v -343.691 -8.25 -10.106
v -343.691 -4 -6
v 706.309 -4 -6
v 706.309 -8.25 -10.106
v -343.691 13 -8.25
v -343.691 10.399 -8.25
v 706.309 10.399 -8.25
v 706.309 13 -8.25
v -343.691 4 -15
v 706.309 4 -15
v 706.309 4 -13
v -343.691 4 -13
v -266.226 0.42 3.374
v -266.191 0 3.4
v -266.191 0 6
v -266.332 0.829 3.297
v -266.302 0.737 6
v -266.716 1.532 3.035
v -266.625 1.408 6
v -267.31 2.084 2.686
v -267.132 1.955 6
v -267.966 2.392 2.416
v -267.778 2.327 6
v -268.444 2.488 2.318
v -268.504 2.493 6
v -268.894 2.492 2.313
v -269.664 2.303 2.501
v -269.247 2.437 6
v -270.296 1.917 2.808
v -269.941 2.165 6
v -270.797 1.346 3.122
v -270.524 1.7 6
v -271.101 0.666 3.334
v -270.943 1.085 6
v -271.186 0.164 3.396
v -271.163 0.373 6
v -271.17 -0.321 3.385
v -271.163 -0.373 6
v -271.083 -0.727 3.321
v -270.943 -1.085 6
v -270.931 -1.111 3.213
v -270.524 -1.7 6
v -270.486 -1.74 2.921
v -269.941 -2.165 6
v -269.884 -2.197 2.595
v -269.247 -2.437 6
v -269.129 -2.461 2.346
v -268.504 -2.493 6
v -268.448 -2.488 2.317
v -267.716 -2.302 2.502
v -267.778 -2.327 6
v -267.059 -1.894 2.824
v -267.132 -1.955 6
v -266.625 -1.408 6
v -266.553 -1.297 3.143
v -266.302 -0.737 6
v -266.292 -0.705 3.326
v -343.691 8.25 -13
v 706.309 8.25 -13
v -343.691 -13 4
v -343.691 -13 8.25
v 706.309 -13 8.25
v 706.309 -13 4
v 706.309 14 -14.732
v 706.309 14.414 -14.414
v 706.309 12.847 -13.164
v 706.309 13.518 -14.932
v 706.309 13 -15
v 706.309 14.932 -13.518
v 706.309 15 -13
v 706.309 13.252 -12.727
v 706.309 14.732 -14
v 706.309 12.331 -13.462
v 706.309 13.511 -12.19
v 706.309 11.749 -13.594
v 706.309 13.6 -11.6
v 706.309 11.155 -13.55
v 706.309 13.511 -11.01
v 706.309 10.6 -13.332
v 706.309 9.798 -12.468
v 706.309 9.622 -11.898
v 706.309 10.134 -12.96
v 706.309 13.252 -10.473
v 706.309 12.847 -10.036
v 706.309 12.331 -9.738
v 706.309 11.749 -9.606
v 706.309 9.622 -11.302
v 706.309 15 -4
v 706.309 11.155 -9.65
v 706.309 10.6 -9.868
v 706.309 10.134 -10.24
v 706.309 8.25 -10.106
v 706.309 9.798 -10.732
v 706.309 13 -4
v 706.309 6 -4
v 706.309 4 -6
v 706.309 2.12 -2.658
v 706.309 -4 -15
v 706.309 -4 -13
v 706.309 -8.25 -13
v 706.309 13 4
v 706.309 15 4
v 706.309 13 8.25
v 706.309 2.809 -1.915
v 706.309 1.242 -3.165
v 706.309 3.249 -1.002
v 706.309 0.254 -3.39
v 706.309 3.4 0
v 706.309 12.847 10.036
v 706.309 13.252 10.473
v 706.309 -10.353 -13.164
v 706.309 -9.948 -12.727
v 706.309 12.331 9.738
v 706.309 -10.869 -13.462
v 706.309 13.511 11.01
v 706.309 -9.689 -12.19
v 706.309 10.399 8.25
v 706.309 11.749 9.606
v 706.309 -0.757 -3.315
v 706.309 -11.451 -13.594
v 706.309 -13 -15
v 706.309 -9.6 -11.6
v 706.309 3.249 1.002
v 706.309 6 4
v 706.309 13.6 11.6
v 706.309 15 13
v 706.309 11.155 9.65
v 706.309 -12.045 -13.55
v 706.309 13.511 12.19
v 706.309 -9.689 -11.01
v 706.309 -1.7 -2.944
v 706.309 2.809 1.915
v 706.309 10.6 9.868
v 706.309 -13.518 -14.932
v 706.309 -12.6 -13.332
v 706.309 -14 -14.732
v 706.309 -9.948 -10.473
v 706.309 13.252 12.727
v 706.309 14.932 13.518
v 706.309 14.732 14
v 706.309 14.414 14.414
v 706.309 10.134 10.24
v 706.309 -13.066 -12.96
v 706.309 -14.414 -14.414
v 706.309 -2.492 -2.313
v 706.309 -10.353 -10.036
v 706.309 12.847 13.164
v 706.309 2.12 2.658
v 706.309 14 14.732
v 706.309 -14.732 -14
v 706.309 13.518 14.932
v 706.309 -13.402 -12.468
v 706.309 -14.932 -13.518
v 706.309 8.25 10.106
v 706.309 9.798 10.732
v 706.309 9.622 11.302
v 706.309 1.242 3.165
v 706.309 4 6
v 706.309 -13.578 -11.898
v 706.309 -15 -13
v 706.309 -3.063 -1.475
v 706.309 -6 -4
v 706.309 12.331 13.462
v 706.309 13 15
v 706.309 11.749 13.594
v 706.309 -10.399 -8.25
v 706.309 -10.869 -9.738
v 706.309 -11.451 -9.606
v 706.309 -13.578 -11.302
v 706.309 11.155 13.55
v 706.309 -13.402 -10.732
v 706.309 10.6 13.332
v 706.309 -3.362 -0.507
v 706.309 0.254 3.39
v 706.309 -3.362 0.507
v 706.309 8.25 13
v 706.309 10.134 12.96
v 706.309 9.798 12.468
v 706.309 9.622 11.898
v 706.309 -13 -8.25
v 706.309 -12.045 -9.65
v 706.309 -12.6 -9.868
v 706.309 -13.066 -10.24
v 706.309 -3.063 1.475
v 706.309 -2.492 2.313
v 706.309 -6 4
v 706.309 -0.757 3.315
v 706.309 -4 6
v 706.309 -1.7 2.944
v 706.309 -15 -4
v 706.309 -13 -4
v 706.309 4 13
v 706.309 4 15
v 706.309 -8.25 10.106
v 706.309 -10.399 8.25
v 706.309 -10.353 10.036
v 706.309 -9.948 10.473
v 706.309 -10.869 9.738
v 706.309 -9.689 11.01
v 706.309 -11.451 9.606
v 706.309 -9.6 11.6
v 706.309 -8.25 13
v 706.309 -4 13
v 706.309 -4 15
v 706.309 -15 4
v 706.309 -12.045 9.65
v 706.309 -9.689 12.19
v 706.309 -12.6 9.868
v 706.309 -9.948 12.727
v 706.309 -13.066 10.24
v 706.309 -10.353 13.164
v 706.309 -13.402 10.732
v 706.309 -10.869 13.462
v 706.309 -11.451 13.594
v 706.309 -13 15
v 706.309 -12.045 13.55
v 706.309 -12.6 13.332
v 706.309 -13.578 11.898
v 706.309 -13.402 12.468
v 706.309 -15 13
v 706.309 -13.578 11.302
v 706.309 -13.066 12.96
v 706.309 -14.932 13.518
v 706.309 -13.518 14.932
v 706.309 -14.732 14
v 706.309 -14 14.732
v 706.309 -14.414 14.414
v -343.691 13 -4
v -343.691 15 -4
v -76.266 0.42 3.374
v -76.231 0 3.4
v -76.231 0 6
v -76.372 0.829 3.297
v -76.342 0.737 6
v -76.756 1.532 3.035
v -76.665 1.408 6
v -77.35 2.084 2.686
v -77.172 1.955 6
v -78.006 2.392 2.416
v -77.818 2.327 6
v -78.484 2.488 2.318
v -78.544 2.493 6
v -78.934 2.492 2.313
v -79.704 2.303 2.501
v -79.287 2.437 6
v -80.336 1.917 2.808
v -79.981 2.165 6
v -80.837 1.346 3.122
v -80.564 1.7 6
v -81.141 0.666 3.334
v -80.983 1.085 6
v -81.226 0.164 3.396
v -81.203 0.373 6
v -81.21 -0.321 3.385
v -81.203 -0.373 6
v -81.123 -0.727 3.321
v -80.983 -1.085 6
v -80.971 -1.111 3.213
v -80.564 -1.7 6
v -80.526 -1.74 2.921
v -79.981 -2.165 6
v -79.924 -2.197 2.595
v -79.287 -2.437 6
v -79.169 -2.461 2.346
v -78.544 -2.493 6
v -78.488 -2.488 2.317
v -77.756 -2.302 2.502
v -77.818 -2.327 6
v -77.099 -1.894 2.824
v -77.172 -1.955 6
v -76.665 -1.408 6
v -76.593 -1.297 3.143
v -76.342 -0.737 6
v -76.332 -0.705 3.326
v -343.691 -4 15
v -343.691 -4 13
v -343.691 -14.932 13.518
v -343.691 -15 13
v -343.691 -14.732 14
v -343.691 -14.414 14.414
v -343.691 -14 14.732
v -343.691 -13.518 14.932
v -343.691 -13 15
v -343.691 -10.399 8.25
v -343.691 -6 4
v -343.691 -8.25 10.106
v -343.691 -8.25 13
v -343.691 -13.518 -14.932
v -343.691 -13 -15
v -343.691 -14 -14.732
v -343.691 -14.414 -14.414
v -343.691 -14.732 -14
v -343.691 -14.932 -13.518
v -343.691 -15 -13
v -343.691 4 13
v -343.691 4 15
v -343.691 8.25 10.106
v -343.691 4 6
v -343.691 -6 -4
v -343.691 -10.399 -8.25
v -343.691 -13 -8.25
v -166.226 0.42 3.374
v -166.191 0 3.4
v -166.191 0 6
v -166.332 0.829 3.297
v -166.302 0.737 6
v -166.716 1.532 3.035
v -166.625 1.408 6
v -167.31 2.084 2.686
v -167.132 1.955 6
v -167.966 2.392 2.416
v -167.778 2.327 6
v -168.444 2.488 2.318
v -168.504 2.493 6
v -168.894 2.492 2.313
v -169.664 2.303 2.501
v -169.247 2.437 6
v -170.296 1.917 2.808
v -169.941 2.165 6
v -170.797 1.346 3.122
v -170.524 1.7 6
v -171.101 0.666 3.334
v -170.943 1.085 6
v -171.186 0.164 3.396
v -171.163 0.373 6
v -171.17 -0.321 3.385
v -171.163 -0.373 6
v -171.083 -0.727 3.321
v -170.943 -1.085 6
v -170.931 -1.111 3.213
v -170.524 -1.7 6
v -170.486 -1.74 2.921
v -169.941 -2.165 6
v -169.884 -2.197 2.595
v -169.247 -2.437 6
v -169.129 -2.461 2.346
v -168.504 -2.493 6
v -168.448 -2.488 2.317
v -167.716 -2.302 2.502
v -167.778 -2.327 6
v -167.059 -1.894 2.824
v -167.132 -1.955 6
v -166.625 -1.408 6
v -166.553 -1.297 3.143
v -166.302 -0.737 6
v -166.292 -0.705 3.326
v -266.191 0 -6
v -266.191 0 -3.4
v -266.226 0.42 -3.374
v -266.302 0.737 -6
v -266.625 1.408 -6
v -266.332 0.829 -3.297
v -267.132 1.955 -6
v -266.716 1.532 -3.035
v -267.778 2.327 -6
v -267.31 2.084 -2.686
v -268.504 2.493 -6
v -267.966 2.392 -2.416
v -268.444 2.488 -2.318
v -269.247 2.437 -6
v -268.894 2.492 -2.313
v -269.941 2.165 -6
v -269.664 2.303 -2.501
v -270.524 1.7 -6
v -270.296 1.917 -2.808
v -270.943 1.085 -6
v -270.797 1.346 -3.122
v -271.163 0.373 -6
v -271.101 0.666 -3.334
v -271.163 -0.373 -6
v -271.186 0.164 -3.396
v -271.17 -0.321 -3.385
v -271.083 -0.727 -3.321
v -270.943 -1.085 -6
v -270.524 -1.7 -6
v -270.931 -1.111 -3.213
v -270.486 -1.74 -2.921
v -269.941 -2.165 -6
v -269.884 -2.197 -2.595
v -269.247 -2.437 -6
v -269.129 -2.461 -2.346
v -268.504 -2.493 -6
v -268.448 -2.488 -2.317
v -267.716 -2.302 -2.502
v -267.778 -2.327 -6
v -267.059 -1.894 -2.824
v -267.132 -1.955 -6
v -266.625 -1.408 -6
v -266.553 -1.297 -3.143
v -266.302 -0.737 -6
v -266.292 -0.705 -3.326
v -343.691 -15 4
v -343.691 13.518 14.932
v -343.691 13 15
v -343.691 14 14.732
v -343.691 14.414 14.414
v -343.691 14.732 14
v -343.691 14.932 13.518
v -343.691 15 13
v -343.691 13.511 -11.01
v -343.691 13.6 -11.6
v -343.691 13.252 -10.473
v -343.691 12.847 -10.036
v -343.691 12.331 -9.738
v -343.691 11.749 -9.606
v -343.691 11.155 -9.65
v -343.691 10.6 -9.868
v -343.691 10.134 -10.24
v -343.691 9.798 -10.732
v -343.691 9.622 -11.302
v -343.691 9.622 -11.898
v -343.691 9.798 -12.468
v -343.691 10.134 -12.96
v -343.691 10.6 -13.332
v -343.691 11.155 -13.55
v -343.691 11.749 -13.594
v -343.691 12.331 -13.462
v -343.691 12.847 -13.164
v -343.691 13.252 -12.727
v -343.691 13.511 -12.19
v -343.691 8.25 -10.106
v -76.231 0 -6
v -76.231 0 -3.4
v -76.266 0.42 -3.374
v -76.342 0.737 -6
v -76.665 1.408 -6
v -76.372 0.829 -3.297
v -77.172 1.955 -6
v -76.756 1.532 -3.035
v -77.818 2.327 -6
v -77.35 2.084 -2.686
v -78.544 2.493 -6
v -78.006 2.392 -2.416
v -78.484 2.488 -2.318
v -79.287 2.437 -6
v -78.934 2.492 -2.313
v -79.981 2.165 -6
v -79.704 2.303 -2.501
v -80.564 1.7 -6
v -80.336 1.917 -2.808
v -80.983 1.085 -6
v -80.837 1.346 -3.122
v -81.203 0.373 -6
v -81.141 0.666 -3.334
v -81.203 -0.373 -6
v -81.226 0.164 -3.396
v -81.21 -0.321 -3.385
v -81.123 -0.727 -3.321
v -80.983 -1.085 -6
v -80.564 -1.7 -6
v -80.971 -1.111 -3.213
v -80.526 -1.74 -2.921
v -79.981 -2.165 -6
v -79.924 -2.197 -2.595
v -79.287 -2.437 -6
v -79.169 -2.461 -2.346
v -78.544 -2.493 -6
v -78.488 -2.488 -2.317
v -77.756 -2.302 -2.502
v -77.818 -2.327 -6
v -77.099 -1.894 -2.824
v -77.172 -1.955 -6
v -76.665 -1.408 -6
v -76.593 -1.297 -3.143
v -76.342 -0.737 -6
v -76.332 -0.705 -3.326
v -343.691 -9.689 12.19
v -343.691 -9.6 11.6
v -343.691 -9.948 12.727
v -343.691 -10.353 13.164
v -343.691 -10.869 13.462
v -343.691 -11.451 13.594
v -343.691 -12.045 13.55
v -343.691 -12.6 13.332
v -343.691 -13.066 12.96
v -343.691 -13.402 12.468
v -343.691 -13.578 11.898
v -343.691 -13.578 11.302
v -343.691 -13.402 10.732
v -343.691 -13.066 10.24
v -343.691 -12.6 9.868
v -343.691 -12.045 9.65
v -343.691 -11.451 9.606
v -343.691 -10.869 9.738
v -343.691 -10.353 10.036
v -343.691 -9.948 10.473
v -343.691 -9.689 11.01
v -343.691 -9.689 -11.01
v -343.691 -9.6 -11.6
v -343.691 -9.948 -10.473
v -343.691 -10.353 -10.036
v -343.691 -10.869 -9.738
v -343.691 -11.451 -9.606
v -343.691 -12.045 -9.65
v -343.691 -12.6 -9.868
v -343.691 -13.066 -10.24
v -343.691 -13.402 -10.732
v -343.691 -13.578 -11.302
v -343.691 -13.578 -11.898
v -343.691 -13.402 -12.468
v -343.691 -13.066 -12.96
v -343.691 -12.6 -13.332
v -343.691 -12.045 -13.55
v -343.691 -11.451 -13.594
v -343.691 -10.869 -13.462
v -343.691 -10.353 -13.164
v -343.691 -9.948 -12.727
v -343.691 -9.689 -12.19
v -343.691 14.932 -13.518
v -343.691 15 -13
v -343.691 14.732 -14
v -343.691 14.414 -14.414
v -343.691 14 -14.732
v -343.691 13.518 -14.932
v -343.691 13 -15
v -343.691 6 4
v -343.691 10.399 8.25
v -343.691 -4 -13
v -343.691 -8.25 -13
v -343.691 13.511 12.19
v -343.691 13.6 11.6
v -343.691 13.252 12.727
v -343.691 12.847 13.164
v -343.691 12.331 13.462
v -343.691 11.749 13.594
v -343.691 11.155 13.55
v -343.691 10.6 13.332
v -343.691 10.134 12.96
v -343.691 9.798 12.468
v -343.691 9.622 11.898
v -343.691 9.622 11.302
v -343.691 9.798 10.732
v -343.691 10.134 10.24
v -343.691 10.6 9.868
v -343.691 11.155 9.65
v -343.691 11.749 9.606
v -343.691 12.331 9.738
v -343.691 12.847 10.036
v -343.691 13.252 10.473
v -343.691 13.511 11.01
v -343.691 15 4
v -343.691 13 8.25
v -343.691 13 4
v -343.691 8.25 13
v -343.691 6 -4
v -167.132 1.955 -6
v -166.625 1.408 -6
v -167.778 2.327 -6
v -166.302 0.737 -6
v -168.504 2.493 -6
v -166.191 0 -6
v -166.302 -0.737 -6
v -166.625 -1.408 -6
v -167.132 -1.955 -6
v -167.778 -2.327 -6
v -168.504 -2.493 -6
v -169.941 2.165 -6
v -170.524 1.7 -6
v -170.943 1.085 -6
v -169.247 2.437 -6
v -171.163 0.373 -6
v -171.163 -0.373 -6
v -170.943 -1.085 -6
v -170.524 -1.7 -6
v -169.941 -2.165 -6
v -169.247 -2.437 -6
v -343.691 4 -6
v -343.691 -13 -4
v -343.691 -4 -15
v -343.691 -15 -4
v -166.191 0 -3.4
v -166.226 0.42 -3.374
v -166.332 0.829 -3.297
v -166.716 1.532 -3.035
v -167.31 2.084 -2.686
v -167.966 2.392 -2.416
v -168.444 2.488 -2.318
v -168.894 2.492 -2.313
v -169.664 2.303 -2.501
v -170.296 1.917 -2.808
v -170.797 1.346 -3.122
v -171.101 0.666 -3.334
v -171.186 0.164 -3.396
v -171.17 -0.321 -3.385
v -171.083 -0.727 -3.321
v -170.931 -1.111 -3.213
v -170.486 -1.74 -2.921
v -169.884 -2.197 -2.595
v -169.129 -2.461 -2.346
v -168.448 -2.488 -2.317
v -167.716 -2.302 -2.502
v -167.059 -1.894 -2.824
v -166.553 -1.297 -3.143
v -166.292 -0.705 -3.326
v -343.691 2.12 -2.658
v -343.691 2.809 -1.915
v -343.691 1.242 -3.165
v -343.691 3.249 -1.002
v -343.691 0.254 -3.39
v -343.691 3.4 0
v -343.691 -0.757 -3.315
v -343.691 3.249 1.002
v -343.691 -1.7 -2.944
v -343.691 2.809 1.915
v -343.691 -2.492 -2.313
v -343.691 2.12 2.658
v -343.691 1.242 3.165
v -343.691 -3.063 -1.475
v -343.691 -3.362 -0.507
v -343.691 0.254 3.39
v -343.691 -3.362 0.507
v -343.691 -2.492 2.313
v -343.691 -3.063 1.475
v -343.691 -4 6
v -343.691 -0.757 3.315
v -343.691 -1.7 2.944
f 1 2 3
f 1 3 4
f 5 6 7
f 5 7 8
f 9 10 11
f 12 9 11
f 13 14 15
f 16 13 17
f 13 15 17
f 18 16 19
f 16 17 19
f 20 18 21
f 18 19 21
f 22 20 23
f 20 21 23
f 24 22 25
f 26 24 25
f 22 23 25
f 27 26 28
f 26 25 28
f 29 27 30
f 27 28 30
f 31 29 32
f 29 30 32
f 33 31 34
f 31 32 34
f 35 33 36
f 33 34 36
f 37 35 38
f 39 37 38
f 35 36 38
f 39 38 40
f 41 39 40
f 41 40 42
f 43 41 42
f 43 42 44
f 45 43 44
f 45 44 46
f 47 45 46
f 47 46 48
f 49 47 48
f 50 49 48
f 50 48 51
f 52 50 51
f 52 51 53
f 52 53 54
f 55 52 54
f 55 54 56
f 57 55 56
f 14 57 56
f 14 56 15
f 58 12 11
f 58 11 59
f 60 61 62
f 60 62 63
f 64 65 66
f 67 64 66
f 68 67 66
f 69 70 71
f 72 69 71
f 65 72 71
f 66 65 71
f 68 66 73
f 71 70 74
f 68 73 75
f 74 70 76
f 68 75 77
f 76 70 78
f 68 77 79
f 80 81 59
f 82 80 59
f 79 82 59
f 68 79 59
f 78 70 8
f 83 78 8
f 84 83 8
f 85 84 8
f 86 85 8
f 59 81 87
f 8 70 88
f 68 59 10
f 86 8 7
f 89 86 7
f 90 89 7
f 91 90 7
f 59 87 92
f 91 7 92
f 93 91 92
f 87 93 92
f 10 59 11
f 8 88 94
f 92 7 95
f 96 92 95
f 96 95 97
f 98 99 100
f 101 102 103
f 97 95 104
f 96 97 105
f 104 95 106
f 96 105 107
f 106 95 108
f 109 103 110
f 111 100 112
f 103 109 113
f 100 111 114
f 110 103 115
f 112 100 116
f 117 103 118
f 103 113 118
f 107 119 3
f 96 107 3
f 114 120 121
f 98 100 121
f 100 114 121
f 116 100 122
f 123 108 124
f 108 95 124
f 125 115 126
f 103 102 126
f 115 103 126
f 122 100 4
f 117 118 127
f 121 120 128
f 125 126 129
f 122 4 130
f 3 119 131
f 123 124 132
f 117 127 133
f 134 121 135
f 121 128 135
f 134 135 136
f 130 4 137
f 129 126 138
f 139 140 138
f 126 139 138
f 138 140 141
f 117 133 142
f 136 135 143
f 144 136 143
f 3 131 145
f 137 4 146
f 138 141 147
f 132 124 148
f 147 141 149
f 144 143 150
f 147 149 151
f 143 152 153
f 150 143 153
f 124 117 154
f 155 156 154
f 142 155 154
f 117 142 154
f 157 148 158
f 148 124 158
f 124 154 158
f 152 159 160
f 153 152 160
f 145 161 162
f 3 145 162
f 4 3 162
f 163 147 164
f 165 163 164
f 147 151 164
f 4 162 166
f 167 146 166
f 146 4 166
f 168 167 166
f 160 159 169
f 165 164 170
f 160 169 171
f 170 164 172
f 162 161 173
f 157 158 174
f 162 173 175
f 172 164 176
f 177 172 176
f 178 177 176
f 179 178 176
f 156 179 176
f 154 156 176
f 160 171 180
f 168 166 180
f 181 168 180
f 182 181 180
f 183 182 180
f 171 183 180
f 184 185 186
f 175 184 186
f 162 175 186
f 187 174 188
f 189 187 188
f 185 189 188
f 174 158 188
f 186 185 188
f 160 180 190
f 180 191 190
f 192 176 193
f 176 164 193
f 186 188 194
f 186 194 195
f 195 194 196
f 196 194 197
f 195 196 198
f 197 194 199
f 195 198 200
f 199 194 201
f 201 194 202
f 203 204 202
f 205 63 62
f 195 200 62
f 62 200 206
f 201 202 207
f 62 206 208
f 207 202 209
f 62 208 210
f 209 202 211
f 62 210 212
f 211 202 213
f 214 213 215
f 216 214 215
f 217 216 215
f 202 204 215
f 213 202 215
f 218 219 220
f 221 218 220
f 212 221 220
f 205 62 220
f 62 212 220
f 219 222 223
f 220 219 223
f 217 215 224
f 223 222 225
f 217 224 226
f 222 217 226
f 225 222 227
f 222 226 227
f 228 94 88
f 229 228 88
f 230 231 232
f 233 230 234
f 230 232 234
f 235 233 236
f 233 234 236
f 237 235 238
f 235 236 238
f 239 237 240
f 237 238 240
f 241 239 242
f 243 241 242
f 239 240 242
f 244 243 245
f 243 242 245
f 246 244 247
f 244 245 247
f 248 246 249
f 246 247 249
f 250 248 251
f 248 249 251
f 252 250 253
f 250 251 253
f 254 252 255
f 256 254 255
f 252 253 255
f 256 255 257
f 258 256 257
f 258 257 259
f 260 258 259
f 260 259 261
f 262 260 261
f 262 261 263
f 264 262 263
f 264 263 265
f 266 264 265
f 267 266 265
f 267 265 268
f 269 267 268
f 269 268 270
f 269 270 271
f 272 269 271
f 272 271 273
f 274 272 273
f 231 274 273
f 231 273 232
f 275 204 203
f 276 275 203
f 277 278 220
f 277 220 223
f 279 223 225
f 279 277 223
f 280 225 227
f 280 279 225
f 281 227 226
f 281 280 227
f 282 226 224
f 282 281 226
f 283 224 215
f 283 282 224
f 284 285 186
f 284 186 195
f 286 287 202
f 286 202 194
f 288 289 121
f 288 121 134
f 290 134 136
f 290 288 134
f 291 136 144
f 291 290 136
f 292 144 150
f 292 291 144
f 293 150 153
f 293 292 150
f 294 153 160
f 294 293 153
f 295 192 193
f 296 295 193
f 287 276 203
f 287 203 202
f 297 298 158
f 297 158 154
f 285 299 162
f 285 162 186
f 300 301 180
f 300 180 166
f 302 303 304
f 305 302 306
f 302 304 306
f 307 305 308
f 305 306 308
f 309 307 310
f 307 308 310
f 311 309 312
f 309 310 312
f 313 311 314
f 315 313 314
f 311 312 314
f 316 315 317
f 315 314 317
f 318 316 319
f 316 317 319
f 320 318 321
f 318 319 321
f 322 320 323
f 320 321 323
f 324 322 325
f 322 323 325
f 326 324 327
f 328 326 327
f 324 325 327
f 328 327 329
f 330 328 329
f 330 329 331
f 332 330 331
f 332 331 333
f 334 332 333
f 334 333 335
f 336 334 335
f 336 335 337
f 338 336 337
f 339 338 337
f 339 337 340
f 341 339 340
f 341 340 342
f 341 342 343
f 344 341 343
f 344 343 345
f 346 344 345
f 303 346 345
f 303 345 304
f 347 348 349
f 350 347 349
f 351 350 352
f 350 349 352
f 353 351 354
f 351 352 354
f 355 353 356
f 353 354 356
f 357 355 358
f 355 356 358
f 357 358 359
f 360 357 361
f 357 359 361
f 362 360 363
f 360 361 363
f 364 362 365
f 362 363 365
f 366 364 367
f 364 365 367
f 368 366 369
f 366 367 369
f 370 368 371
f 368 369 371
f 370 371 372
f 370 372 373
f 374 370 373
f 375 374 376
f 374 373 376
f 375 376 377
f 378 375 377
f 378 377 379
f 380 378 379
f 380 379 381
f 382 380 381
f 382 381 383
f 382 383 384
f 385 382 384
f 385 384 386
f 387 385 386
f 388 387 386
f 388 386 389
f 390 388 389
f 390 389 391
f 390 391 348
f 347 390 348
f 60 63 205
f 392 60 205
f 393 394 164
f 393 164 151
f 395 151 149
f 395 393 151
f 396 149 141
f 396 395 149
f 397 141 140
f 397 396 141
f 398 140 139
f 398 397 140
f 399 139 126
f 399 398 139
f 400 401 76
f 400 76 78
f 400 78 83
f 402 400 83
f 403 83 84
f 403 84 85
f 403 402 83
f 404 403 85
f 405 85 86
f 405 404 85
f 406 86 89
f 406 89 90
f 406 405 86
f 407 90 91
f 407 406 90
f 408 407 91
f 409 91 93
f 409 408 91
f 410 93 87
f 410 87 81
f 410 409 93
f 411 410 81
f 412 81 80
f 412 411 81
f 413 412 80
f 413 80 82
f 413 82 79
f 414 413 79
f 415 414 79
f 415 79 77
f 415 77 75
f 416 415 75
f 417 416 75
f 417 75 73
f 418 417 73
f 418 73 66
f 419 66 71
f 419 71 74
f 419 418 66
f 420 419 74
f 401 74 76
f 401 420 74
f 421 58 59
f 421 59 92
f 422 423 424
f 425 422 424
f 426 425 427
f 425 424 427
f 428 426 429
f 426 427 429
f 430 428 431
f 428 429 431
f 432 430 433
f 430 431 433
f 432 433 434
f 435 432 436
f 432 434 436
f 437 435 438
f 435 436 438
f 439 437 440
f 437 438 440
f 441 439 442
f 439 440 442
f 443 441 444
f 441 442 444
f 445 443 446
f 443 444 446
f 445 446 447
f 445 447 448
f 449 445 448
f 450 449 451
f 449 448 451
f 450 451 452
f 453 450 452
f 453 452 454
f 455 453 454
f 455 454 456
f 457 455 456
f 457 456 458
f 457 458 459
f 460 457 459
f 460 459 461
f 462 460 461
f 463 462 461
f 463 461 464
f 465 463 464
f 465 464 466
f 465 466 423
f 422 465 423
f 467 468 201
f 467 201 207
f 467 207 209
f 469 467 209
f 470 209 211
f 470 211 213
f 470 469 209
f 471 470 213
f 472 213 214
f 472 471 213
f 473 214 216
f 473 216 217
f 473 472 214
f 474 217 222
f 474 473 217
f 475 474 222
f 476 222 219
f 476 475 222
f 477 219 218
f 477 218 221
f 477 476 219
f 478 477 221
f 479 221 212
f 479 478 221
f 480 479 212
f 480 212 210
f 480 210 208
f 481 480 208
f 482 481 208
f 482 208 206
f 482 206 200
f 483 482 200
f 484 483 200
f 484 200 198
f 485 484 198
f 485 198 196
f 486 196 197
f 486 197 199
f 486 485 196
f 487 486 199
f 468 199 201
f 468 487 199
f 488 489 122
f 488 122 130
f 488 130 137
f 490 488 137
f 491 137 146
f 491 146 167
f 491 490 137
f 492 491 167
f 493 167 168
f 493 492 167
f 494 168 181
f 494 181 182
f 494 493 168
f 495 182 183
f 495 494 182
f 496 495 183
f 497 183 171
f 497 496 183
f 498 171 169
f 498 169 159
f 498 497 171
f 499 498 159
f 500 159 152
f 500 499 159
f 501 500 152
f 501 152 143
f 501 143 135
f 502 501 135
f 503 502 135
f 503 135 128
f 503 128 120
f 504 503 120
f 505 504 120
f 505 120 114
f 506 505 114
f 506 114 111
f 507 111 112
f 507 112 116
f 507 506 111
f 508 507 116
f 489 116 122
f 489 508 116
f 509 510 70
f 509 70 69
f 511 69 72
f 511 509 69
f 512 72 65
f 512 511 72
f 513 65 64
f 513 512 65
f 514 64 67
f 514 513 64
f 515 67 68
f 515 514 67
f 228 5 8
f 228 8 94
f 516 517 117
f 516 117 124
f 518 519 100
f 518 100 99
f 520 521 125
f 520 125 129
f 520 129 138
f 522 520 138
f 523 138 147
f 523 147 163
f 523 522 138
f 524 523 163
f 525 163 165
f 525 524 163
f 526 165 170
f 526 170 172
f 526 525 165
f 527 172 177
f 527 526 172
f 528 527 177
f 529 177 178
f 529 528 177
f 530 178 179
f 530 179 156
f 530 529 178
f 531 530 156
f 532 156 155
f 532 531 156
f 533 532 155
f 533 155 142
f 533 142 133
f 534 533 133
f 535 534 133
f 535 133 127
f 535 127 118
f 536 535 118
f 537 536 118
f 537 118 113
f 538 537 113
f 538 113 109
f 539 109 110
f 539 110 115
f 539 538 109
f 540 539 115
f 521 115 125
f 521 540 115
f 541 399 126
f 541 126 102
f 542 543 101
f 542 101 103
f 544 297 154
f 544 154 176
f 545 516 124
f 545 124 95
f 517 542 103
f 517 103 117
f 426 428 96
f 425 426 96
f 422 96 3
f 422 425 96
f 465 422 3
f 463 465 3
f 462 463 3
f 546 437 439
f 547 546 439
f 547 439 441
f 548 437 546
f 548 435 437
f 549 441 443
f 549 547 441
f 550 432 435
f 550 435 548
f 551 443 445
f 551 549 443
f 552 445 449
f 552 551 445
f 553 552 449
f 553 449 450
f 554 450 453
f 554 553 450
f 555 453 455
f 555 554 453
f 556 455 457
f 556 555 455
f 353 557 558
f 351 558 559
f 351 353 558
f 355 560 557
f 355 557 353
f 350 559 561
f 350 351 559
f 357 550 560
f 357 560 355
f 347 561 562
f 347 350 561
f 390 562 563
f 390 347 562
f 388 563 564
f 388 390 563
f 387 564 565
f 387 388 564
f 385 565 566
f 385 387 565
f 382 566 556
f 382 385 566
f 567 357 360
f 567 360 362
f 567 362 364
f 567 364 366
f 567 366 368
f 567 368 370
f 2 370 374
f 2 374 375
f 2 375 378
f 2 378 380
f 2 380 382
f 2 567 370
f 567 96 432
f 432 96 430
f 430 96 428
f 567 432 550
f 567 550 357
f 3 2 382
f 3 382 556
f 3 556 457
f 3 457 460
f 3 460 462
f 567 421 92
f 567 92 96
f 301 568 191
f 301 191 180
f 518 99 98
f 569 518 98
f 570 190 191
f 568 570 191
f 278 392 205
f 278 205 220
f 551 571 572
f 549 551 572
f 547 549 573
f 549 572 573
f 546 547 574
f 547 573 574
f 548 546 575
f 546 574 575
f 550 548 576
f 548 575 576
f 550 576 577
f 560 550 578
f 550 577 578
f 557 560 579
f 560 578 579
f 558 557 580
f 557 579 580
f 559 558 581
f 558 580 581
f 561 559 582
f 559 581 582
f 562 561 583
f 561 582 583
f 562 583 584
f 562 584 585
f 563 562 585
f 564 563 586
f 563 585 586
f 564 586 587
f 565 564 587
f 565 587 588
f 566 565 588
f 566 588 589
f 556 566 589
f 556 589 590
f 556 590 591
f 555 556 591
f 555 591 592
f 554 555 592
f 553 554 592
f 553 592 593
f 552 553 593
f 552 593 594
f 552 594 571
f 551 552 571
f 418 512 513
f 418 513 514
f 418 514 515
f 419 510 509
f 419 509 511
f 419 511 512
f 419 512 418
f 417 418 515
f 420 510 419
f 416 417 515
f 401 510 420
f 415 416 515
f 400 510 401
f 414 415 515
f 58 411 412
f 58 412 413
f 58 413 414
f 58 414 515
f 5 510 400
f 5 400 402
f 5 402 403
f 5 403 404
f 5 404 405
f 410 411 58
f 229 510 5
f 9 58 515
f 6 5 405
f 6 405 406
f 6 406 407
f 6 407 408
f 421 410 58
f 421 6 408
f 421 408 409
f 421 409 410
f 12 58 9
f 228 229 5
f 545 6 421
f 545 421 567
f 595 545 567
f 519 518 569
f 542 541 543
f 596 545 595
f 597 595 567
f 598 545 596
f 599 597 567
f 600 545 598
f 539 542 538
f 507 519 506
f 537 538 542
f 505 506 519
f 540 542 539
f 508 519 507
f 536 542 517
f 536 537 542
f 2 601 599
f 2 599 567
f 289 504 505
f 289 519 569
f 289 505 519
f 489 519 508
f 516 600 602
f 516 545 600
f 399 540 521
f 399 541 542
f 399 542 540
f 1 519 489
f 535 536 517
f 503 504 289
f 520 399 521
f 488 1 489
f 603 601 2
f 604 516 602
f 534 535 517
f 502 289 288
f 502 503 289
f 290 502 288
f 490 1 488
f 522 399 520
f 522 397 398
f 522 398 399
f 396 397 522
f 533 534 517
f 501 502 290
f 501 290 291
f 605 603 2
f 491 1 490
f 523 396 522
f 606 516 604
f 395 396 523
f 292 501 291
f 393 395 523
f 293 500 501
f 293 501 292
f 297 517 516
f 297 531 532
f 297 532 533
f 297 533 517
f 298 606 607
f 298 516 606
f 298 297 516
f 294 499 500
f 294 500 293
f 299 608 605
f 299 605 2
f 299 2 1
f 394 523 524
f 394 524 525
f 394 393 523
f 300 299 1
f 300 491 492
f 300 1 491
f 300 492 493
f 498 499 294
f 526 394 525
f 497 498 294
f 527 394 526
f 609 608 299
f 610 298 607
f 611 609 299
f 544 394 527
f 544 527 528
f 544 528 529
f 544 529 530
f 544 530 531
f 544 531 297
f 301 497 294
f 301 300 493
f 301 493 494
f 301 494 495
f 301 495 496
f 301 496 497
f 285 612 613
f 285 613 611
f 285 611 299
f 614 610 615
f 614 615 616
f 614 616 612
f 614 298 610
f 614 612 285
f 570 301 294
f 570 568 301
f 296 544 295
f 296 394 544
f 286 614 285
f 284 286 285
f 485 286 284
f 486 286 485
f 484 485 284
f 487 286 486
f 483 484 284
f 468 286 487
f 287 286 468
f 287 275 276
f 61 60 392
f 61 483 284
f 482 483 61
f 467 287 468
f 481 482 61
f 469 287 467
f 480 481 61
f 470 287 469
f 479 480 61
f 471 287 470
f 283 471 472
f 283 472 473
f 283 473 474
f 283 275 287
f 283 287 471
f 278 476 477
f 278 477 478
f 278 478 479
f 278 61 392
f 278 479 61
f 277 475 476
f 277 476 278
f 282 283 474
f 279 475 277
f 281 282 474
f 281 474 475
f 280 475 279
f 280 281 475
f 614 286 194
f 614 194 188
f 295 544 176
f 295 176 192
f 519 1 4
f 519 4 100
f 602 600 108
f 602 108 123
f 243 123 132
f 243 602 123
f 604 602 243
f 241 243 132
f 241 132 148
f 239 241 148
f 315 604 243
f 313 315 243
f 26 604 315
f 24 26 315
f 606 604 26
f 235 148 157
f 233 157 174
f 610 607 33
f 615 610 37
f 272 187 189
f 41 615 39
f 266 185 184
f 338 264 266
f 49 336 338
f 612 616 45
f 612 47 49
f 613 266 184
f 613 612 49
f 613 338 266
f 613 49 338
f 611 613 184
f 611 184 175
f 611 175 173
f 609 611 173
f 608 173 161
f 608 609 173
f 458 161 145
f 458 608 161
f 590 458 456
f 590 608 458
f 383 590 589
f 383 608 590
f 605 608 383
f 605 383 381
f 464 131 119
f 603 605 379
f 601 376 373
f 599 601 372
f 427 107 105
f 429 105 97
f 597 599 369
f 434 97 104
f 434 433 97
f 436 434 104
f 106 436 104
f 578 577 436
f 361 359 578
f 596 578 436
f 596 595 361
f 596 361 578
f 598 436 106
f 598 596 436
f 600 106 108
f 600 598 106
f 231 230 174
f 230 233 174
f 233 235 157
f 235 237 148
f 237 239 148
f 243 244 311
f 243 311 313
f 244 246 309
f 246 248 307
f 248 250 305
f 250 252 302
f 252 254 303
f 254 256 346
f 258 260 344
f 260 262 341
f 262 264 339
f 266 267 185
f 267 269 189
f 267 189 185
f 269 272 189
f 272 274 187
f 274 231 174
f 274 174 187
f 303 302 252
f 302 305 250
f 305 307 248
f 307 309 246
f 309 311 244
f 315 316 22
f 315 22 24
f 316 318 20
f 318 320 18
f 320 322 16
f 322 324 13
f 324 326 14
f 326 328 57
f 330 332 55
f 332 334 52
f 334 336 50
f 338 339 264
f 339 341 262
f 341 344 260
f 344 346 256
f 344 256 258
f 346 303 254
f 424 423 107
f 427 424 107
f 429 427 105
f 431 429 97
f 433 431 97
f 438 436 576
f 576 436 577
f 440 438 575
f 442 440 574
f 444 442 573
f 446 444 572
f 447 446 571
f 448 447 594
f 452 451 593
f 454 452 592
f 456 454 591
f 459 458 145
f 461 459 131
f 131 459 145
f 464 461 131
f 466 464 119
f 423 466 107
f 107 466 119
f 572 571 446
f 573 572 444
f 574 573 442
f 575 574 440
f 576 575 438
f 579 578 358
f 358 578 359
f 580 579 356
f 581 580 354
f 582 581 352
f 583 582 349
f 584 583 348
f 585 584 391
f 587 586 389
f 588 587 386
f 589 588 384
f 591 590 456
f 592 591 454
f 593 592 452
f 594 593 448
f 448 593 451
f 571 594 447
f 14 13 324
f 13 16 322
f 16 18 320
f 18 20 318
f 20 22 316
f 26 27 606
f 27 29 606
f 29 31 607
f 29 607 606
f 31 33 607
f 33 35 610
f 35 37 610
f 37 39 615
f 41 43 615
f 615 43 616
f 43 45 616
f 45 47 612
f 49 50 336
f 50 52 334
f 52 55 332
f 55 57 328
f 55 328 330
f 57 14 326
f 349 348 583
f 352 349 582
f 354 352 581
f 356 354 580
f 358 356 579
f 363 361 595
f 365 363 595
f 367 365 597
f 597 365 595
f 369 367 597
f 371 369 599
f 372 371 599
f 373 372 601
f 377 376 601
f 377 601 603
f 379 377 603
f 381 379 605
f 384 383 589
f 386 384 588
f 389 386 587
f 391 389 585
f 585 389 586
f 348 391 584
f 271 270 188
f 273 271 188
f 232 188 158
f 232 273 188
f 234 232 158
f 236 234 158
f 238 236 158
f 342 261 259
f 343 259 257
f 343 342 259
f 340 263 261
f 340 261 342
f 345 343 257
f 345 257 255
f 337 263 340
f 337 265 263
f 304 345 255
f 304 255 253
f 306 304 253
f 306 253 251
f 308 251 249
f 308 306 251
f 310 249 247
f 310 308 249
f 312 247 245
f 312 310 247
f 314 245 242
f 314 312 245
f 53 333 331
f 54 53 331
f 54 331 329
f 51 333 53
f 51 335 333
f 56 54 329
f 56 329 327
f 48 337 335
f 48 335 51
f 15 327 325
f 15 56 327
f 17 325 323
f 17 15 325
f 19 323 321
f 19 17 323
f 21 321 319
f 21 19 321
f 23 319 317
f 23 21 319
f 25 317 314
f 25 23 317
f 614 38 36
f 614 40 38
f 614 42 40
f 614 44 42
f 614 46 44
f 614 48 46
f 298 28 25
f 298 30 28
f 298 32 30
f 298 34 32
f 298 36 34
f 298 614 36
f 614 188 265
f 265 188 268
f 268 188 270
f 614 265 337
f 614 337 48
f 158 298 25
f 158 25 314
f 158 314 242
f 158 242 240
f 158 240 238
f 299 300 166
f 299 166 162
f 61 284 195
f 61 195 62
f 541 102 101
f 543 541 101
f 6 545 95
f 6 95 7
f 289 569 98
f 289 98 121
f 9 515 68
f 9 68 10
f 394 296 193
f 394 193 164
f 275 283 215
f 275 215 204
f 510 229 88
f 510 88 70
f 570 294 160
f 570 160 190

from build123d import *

# Parameters (mm, degrees)
SKETCH11_R                = 3.4
SKETCH11_R_2              = 2
NEW_ALUM_ALUM3BY3_1_DEPTH = 1050
SKETCH12_R                = 2.5
CUT_EXTRUDE1_DEPTH        = 707.780320658


with BuildPart() as part:
    # Sketch11 → New alum ALUM3BY3(1) (new body)
    with BuildSketch(Plane.YZ.offset(-343.690987124)):
        with BuildLine():
            Line((-4, 6), (4, 6))
            Line((4, 6), (8.25, 10.106126974))
            Line((8.25, 10.106126974), (8.25, 13))
            Line((8.25, 13), (4, 13))
            Line((4, 13), (4, 15))
            Line((4, 15), (13, 15))
            ThreePointArc((13, 15), (14.414213562, 14.414213562), (15, 13))
            Line((15, 13), (15, 4))
            Line((15, 4), (13, 4))
            Line((13, 4), (13, 8.25))
            Line((13, 8.25), (10.398914138, 8.25))
            Line((10.398914138, 8.25), (6, 4))
            Line((6, 4), (6, -4))
            Line((6, -4), (10.398914138, -8.25))
            Line((10.398914138, -8.25), (13, -8.25))
            Line((13, -8.25), (13, -4))
            Line((13, -4), (15, -4))
            Line((15, -4), (15, -13))
            ThreePointArc((15, -13), (14.414213562, -14.414213562), (13, -15))
            Line((13, -15), (4, -15))
            Line((4, -15), (4, -13))
            Line((4, -13), (8.25, -13))
            Line((8.25, -13), (8.25, -10.106126974))
            Line((8.25, -10.106126974), (4, -6))
            Line((4, -6), (-4, -6))
            Line((-4, -6), (-8.25, -10.106126974))
            Line((-8.25, -10.106126974), (-8.25, -13))
            Line((-8.25, -13), (-4, -13))
            Line((-4, -13), (-4, -15))
            Line((-4, -15), (-13, -15))
            ThreePointArc((-13, -15), (-14.414213562, -14.414213562), (-15, -13))
            Line((-15, -13), (-15, -4))
            Line((-15, -4), (-13, -4))
            Line((-13, -4), (-13, -8.25))
            Line((-13, -8.25), (-10.398914138, -8.25))
            Line((-10.398914138, -8.25), (-6, -4))
            Line((-6, -4), (-6, 4))
            Line((-6, 4), (-10.398914138, 8.25))
            Line((-10.398914138, 8.25), (-13, 8.25))
            Line((-13, 8.25), (-13, 4))
            Line((-13, 4), (-15, 4))
            Line((-15, 4), (-15, 13))
            ThreePointArc((-15, 13), (-14.414213562, 14.414213562), (-13, 15))
            Line((-13, 15), (-4, 15))
            Line((-4, 15), (-4, 13))
            Line((-4, 13), (-8.25, 13))
            Line((-8.25, 13), (-8.25, 10.106126974))
            Line((-8.25, 10.106126974), (-4, 6))
        make_face()
        Circle(SKETCH11_R, mode=Mode.SUBTRACT)
        with Locations((11.6, 11.6)):
            Circle(SKETCH11_R_2, mode=Mode.SUBTRACT)
        with Locations((-11.6, 11.6)):
            Circle(SKETCH11_R_2, mode=Mode.SUBTRACT)
        with Locations((11.6, -11.6)):
            Circle(SKETCH11_R_2, mode=Mode.SUBTRACT)
        with Locations((-11.6, -11.6)):
            Circle(SKETCH11_R_2, mode=Mode.SUBTRACT)
    extrude(amount=NEW_ALUM_ALUM3BY3_1_DEPTH)

    # Sketch12 → Cut-Extrude1 (cut, through all)
    with BuildSketch(Plane.XY.offset(6)):
        with Locations((-268.690987124, 0)):
            Circle(SKETCH12_R)
        with Locations((-168.690987124, 0)):
            Circle(SKETCH12_R)
        with Locations((-78.730987124, 0)):
            Circle(SKETCH12_R)
    extrude(amount=-CUT_EXTRUDE1_DEPTH, mode=Mode.SUBTRACT)


solid = part.part
